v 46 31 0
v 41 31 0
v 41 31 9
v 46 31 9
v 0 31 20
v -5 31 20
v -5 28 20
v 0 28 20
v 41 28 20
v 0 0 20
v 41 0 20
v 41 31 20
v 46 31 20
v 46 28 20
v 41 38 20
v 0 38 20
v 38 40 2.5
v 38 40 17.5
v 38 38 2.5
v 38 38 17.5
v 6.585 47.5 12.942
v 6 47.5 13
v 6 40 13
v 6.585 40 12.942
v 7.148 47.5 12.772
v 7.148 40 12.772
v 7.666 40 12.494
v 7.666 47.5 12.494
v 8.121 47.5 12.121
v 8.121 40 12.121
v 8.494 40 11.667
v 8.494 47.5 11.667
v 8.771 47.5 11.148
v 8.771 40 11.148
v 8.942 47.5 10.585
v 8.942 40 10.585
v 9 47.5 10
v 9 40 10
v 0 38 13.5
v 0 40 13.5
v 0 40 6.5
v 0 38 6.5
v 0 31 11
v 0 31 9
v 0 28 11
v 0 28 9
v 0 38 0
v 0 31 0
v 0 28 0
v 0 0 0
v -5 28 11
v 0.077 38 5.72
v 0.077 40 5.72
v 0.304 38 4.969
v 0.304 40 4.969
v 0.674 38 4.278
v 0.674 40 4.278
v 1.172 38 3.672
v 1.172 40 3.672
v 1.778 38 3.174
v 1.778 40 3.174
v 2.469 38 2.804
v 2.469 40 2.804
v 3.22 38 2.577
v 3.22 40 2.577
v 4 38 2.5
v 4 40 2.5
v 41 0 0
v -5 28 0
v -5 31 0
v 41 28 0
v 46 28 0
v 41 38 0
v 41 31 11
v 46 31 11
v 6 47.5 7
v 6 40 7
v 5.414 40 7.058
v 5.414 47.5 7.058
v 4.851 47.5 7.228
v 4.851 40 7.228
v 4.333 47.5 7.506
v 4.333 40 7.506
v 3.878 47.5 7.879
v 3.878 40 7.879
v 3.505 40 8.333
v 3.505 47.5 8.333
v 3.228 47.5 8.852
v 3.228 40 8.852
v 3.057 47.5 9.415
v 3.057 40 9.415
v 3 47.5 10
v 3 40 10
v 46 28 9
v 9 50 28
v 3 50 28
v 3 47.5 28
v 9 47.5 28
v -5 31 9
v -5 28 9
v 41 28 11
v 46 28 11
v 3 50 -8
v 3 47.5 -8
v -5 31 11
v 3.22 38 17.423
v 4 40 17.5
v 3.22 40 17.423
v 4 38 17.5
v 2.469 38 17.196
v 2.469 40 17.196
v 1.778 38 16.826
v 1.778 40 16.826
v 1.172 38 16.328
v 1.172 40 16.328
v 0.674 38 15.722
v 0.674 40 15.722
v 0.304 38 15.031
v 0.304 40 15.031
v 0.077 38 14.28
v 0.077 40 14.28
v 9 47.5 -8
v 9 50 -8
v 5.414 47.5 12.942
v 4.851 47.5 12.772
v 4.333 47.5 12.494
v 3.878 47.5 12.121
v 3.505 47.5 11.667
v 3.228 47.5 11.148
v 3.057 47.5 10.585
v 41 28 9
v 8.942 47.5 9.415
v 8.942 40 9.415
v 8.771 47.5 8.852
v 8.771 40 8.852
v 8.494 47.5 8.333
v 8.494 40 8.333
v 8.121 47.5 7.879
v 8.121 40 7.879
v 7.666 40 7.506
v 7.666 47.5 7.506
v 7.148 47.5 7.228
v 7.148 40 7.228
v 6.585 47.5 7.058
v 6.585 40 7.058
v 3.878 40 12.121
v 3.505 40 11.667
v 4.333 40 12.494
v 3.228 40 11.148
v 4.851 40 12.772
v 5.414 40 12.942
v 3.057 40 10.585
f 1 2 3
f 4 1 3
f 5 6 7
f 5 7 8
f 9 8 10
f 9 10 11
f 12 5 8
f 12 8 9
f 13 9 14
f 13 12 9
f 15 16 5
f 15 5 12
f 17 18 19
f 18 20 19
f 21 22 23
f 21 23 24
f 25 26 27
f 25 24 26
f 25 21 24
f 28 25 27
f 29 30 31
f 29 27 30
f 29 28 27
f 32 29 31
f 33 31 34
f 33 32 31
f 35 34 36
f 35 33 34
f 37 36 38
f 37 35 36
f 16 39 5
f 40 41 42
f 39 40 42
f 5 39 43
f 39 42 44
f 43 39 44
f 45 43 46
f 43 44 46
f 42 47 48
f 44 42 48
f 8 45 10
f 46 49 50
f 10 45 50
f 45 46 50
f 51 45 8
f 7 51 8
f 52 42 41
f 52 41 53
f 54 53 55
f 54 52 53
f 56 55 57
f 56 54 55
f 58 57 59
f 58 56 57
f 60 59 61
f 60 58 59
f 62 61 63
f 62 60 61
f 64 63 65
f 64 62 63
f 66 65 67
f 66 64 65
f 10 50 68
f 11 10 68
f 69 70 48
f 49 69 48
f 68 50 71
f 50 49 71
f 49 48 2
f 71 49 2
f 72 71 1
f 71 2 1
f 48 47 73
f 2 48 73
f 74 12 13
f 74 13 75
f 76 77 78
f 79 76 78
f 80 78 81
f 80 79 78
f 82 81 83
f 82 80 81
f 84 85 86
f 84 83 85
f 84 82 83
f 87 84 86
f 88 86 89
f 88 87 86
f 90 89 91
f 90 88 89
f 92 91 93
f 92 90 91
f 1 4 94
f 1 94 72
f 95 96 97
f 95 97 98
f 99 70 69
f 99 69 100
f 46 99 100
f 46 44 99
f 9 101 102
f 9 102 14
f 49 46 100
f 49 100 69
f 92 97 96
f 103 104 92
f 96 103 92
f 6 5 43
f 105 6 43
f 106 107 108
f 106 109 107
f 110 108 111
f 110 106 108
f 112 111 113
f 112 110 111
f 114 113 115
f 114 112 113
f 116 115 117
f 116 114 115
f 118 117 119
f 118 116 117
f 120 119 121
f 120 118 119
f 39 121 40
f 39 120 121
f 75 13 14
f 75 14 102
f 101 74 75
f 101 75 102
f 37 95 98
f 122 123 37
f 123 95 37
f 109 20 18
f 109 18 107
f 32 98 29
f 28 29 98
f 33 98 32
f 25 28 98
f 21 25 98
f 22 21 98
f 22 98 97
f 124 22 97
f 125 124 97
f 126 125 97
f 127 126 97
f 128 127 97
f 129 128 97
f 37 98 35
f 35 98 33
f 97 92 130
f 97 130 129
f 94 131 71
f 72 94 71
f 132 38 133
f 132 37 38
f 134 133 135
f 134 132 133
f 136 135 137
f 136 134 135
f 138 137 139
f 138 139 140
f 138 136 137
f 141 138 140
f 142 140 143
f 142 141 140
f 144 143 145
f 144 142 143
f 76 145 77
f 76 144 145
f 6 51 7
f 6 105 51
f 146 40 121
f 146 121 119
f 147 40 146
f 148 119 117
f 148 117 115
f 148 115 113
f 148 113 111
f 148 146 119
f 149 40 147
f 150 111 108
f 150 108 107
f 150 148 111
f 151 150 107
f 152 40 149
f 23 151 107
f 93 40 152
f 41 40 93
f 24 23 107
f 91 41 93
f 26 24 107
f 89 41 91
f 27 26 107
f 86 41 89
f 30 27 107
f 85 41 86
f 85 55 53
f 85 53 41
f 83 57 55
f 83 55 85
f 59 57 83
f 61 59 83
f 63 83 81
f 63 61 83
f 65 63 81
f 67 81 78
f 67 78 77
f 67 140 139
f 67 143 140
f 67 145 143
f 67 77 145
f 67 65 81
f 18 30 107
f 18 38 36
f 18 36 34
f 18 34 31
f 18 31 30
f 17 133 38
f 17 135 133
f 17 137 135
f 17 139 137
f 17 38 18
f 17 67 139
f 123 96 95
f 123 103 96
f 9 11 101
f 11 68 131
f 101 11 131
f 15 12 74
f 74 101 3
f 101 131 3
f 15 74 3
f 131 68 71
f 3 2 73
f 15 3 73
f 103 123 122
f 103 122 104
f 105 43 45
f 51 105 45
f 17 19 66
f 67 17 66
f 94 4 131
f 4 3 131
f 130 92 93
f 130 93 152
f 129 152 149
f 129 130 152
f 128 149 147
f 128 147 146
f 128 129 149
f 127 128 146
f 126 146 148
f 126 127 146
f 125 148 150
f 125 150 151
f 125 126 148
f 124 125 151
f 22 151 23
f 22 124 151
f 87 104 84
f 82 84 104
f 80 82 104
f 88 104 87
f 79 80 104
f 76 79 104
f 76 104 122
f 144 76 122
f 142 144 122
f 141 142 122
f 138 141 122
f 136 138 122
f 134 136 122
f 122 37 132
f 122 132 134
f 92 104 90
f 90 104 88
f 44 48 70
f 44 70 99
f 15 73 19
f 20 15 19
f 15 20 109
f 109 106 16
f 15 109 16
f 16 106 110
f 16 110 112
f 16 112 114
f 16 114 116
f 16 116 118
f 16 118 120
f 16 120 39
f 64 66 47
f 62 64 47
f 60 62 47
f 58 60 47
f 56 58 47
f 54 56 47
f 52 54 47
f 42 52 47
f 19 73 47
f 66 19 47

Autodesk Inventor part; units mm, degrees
ref_plane "YZ Plane" through (0, 0, 0) normal (1, 0, 0) x (0, 1, 0)
ref_plane "XZ Plane" through (0, 0, 0) normal (0, 1, 0) x (-1, 0, 0)
ref_plane "XY Plane" through (0, 0, 0) normal (0, 0, 1) x (1, 0, 0)
sketch "Esquisse1" plane through (0, 0, 0) normal (0, 0, 1) x (1, 0, 0)
  line L0 (0, 0) -> (41, 0)
  line L1 (41, 0) -> (41, 38)
  line L2 (41, 38) -> (0, 38)
  line L3 (0, 38) -> (0, 0)
  dimension "d0" = 41
  dimension "d1" = 38
extrude "Extrusion1" add sketch "Esquisse1" along normal blind 20
sketch "Esquisse2" plane through (0, 38, 0) normal (0, 1, 0) x (1, 0, 0)
  line L0 (0, 0) -> (0, -20) projected
  line L1 (0, -10) -> (0, -15)
  line L2 (0, -15) -> (0, -6.5)
  line L3 (0, -10) -> (38, -10)
  line L4 (38, -10) -> (38, -2.5)
  line L5 (38, -2.5) -> (4, -2.5)
  line L6 (0, -2.5) -> (0, -10)
  line L7 (38, -10) -> (38, -17.5)
  line L8 (38, -17.5) -> (4, -17.5)
  line L9 (0, -13.5) -> (0, -10)
  arc A0 (0, -13.5) -> (4, -17.5) centre (4, -13.5) ccw
  arc A1 (4, -2.5) -> (0, -6.5) centre (4, -6.5) ccw
  point P0 (0, -5)
  point P1 (0, -17.5)
  point P2 (0, -2.5)
  point P3 (0, -17.5)
  point P4 (0, -13.5)
  dimension "d6" = 38
  dimension "d9" = 15
  dimension "d10" = 4
  dimension "d11" = 4
extrude "Extrusion2" add sketch "Esquisse2" along normal blind 2
sketch "Esquisse3" plane through (0, 40, 0) normal (0, 1, 0) x (1, 0, 0)
  line L0 (4, -17.5) -> (38, -17.5) projected
  line L1 (0, -6.5) -> (0, -13.5) projected
  line L2 (2.9996, -7) -> (8.9996, -7)
  line L3 (8.9996, -7) -> (8.9996, -13)
  line L4 (8.9996, -13) -> (2.9996, -13)
  line L5 (2.9996, -13) -> (2.9996, -7)
  line L6 (2.9996, -7) -> (8.9996, -13) construction
  line L7 (8.9996, -7) -> (2.9996, -13) construction
  point P0 (0, 0)
  point P1 (5.9996, -10)
  dimension "d12" = 7.5
  dimension "d13" = 5.9996
  dimension "d14" = 6
  dimension "d15" = 6
extrude "Extrusion3" add sketch "Esquisse3" along normal blind 10
sketch "Esquisse4" plane through (8.9996, 40, 7) normal (0, 0, -1) x (-1, 0, 0)
  line L0 (6, 10) -> (0, 10) projected
  line L1 (0, 10) -> (6, 10)
  line L2 (6, 10) -> (6, 7.5)
  line L3 (6, 7.5) -> (0, 7.5)
  line L4 (0, 7.5) -> (0, 10)
  point P0 (8.9996, -40)
  dimension "d18" = 6
  dimension "d19" = 2.5
extrude "Extrusion4" add sketch "Esquisse4" along normal blind 15
sketch "Esquisse6" plane through (2.9996, 40, 13) normal (0, 0, 1) x (1, 0, 0)
  line L0 (0, 10) -> (6, 10) projected
  line L1 (0, 10) -> (6, 10)
  line L2 (6, 10) -> (6, 7.5)
  line L3 (6, 7.5) -> (0, 7.5)
  line L4 (0, 7.5) -> (0, 10)
  point P0 (-2.9996, -40)
  dimension "d22" = 6
  dimension "d23" = 2.5
extrude "Extrusion5" add sketch "Esquisse6" along normal blind 15
fillet "Congé1" radius 3 4 edges at (2.9996, 43.75, 7) (2.9996, 43.75, 13) (8.9996, 43.75, 13) (8.9996, 43.75, 7)
sketch "Esquisse9" plane through (41, 0, 0) normal (1, 0, 0) x (0, 0, -1)
  line L0 (-20, 0) -> (-20, 38) projected
  line L1 (-20, 38) -> (-20, 31)
  line L2 (-20, 31) -> (-11, 31)
  line L3 (-11, 31) -> (-11, 28)
  line L4 (-11, 28) -> (-20, 28)
  line L5 (-20, 28) -> (-20, 31)
  line L6 (-11, 31) -> (-10, 31)
  line L7 (0, 31) -> (-9, 31)
  line L8 (-9, 31) -> (-9, 28)
  line L9 (-9, 28) -> (0, 28)
  line L10 (0, 28) -> (0, 31)
  point P0 (0, 0)
  dimension "d38" = 7
  dimension "d39" = 9
  dimension "d40" = 3
  dimension "d41" = 1
extrude "Extrusion9" add sketch "Esquisse9" along normal blind 5
sketch "Esquisse10" plane through (0, 0, 0) normal (-1, 0, 0) x (0, 0, 1)
  line L0 (0, 38) -> (0, 31)
  line L1 (0, 38) -> (0, 0) projected
  line L2 (0, 31) -> (9, 31)
  line L3 (9, 31) -> (9, 28)
  line L4 (9, 28) -> (0, 28)
  line L5 (0, 28) -> (0, 31)
  line L6 (9, 31) -> (10, 31)
  line L7 (10, 31) -> (10, 24.8436)
  line L8 (20, 31) -> (11, 31)
  line L9 (11, 31) -> (11, 28)
  line L10 (11, 28) -> (20, 28)
  line L11 (20, 28) -> (20, 31)
  dimension "d44" = 7
  dimension "d45" = 9
  dimension "d46" = 3
  dimension "d47" = 1
extrude "Extrusion10" add sketch "Esquisse10" along normal blind 5
properties part number "Servomoteur analogique FS5106B"
